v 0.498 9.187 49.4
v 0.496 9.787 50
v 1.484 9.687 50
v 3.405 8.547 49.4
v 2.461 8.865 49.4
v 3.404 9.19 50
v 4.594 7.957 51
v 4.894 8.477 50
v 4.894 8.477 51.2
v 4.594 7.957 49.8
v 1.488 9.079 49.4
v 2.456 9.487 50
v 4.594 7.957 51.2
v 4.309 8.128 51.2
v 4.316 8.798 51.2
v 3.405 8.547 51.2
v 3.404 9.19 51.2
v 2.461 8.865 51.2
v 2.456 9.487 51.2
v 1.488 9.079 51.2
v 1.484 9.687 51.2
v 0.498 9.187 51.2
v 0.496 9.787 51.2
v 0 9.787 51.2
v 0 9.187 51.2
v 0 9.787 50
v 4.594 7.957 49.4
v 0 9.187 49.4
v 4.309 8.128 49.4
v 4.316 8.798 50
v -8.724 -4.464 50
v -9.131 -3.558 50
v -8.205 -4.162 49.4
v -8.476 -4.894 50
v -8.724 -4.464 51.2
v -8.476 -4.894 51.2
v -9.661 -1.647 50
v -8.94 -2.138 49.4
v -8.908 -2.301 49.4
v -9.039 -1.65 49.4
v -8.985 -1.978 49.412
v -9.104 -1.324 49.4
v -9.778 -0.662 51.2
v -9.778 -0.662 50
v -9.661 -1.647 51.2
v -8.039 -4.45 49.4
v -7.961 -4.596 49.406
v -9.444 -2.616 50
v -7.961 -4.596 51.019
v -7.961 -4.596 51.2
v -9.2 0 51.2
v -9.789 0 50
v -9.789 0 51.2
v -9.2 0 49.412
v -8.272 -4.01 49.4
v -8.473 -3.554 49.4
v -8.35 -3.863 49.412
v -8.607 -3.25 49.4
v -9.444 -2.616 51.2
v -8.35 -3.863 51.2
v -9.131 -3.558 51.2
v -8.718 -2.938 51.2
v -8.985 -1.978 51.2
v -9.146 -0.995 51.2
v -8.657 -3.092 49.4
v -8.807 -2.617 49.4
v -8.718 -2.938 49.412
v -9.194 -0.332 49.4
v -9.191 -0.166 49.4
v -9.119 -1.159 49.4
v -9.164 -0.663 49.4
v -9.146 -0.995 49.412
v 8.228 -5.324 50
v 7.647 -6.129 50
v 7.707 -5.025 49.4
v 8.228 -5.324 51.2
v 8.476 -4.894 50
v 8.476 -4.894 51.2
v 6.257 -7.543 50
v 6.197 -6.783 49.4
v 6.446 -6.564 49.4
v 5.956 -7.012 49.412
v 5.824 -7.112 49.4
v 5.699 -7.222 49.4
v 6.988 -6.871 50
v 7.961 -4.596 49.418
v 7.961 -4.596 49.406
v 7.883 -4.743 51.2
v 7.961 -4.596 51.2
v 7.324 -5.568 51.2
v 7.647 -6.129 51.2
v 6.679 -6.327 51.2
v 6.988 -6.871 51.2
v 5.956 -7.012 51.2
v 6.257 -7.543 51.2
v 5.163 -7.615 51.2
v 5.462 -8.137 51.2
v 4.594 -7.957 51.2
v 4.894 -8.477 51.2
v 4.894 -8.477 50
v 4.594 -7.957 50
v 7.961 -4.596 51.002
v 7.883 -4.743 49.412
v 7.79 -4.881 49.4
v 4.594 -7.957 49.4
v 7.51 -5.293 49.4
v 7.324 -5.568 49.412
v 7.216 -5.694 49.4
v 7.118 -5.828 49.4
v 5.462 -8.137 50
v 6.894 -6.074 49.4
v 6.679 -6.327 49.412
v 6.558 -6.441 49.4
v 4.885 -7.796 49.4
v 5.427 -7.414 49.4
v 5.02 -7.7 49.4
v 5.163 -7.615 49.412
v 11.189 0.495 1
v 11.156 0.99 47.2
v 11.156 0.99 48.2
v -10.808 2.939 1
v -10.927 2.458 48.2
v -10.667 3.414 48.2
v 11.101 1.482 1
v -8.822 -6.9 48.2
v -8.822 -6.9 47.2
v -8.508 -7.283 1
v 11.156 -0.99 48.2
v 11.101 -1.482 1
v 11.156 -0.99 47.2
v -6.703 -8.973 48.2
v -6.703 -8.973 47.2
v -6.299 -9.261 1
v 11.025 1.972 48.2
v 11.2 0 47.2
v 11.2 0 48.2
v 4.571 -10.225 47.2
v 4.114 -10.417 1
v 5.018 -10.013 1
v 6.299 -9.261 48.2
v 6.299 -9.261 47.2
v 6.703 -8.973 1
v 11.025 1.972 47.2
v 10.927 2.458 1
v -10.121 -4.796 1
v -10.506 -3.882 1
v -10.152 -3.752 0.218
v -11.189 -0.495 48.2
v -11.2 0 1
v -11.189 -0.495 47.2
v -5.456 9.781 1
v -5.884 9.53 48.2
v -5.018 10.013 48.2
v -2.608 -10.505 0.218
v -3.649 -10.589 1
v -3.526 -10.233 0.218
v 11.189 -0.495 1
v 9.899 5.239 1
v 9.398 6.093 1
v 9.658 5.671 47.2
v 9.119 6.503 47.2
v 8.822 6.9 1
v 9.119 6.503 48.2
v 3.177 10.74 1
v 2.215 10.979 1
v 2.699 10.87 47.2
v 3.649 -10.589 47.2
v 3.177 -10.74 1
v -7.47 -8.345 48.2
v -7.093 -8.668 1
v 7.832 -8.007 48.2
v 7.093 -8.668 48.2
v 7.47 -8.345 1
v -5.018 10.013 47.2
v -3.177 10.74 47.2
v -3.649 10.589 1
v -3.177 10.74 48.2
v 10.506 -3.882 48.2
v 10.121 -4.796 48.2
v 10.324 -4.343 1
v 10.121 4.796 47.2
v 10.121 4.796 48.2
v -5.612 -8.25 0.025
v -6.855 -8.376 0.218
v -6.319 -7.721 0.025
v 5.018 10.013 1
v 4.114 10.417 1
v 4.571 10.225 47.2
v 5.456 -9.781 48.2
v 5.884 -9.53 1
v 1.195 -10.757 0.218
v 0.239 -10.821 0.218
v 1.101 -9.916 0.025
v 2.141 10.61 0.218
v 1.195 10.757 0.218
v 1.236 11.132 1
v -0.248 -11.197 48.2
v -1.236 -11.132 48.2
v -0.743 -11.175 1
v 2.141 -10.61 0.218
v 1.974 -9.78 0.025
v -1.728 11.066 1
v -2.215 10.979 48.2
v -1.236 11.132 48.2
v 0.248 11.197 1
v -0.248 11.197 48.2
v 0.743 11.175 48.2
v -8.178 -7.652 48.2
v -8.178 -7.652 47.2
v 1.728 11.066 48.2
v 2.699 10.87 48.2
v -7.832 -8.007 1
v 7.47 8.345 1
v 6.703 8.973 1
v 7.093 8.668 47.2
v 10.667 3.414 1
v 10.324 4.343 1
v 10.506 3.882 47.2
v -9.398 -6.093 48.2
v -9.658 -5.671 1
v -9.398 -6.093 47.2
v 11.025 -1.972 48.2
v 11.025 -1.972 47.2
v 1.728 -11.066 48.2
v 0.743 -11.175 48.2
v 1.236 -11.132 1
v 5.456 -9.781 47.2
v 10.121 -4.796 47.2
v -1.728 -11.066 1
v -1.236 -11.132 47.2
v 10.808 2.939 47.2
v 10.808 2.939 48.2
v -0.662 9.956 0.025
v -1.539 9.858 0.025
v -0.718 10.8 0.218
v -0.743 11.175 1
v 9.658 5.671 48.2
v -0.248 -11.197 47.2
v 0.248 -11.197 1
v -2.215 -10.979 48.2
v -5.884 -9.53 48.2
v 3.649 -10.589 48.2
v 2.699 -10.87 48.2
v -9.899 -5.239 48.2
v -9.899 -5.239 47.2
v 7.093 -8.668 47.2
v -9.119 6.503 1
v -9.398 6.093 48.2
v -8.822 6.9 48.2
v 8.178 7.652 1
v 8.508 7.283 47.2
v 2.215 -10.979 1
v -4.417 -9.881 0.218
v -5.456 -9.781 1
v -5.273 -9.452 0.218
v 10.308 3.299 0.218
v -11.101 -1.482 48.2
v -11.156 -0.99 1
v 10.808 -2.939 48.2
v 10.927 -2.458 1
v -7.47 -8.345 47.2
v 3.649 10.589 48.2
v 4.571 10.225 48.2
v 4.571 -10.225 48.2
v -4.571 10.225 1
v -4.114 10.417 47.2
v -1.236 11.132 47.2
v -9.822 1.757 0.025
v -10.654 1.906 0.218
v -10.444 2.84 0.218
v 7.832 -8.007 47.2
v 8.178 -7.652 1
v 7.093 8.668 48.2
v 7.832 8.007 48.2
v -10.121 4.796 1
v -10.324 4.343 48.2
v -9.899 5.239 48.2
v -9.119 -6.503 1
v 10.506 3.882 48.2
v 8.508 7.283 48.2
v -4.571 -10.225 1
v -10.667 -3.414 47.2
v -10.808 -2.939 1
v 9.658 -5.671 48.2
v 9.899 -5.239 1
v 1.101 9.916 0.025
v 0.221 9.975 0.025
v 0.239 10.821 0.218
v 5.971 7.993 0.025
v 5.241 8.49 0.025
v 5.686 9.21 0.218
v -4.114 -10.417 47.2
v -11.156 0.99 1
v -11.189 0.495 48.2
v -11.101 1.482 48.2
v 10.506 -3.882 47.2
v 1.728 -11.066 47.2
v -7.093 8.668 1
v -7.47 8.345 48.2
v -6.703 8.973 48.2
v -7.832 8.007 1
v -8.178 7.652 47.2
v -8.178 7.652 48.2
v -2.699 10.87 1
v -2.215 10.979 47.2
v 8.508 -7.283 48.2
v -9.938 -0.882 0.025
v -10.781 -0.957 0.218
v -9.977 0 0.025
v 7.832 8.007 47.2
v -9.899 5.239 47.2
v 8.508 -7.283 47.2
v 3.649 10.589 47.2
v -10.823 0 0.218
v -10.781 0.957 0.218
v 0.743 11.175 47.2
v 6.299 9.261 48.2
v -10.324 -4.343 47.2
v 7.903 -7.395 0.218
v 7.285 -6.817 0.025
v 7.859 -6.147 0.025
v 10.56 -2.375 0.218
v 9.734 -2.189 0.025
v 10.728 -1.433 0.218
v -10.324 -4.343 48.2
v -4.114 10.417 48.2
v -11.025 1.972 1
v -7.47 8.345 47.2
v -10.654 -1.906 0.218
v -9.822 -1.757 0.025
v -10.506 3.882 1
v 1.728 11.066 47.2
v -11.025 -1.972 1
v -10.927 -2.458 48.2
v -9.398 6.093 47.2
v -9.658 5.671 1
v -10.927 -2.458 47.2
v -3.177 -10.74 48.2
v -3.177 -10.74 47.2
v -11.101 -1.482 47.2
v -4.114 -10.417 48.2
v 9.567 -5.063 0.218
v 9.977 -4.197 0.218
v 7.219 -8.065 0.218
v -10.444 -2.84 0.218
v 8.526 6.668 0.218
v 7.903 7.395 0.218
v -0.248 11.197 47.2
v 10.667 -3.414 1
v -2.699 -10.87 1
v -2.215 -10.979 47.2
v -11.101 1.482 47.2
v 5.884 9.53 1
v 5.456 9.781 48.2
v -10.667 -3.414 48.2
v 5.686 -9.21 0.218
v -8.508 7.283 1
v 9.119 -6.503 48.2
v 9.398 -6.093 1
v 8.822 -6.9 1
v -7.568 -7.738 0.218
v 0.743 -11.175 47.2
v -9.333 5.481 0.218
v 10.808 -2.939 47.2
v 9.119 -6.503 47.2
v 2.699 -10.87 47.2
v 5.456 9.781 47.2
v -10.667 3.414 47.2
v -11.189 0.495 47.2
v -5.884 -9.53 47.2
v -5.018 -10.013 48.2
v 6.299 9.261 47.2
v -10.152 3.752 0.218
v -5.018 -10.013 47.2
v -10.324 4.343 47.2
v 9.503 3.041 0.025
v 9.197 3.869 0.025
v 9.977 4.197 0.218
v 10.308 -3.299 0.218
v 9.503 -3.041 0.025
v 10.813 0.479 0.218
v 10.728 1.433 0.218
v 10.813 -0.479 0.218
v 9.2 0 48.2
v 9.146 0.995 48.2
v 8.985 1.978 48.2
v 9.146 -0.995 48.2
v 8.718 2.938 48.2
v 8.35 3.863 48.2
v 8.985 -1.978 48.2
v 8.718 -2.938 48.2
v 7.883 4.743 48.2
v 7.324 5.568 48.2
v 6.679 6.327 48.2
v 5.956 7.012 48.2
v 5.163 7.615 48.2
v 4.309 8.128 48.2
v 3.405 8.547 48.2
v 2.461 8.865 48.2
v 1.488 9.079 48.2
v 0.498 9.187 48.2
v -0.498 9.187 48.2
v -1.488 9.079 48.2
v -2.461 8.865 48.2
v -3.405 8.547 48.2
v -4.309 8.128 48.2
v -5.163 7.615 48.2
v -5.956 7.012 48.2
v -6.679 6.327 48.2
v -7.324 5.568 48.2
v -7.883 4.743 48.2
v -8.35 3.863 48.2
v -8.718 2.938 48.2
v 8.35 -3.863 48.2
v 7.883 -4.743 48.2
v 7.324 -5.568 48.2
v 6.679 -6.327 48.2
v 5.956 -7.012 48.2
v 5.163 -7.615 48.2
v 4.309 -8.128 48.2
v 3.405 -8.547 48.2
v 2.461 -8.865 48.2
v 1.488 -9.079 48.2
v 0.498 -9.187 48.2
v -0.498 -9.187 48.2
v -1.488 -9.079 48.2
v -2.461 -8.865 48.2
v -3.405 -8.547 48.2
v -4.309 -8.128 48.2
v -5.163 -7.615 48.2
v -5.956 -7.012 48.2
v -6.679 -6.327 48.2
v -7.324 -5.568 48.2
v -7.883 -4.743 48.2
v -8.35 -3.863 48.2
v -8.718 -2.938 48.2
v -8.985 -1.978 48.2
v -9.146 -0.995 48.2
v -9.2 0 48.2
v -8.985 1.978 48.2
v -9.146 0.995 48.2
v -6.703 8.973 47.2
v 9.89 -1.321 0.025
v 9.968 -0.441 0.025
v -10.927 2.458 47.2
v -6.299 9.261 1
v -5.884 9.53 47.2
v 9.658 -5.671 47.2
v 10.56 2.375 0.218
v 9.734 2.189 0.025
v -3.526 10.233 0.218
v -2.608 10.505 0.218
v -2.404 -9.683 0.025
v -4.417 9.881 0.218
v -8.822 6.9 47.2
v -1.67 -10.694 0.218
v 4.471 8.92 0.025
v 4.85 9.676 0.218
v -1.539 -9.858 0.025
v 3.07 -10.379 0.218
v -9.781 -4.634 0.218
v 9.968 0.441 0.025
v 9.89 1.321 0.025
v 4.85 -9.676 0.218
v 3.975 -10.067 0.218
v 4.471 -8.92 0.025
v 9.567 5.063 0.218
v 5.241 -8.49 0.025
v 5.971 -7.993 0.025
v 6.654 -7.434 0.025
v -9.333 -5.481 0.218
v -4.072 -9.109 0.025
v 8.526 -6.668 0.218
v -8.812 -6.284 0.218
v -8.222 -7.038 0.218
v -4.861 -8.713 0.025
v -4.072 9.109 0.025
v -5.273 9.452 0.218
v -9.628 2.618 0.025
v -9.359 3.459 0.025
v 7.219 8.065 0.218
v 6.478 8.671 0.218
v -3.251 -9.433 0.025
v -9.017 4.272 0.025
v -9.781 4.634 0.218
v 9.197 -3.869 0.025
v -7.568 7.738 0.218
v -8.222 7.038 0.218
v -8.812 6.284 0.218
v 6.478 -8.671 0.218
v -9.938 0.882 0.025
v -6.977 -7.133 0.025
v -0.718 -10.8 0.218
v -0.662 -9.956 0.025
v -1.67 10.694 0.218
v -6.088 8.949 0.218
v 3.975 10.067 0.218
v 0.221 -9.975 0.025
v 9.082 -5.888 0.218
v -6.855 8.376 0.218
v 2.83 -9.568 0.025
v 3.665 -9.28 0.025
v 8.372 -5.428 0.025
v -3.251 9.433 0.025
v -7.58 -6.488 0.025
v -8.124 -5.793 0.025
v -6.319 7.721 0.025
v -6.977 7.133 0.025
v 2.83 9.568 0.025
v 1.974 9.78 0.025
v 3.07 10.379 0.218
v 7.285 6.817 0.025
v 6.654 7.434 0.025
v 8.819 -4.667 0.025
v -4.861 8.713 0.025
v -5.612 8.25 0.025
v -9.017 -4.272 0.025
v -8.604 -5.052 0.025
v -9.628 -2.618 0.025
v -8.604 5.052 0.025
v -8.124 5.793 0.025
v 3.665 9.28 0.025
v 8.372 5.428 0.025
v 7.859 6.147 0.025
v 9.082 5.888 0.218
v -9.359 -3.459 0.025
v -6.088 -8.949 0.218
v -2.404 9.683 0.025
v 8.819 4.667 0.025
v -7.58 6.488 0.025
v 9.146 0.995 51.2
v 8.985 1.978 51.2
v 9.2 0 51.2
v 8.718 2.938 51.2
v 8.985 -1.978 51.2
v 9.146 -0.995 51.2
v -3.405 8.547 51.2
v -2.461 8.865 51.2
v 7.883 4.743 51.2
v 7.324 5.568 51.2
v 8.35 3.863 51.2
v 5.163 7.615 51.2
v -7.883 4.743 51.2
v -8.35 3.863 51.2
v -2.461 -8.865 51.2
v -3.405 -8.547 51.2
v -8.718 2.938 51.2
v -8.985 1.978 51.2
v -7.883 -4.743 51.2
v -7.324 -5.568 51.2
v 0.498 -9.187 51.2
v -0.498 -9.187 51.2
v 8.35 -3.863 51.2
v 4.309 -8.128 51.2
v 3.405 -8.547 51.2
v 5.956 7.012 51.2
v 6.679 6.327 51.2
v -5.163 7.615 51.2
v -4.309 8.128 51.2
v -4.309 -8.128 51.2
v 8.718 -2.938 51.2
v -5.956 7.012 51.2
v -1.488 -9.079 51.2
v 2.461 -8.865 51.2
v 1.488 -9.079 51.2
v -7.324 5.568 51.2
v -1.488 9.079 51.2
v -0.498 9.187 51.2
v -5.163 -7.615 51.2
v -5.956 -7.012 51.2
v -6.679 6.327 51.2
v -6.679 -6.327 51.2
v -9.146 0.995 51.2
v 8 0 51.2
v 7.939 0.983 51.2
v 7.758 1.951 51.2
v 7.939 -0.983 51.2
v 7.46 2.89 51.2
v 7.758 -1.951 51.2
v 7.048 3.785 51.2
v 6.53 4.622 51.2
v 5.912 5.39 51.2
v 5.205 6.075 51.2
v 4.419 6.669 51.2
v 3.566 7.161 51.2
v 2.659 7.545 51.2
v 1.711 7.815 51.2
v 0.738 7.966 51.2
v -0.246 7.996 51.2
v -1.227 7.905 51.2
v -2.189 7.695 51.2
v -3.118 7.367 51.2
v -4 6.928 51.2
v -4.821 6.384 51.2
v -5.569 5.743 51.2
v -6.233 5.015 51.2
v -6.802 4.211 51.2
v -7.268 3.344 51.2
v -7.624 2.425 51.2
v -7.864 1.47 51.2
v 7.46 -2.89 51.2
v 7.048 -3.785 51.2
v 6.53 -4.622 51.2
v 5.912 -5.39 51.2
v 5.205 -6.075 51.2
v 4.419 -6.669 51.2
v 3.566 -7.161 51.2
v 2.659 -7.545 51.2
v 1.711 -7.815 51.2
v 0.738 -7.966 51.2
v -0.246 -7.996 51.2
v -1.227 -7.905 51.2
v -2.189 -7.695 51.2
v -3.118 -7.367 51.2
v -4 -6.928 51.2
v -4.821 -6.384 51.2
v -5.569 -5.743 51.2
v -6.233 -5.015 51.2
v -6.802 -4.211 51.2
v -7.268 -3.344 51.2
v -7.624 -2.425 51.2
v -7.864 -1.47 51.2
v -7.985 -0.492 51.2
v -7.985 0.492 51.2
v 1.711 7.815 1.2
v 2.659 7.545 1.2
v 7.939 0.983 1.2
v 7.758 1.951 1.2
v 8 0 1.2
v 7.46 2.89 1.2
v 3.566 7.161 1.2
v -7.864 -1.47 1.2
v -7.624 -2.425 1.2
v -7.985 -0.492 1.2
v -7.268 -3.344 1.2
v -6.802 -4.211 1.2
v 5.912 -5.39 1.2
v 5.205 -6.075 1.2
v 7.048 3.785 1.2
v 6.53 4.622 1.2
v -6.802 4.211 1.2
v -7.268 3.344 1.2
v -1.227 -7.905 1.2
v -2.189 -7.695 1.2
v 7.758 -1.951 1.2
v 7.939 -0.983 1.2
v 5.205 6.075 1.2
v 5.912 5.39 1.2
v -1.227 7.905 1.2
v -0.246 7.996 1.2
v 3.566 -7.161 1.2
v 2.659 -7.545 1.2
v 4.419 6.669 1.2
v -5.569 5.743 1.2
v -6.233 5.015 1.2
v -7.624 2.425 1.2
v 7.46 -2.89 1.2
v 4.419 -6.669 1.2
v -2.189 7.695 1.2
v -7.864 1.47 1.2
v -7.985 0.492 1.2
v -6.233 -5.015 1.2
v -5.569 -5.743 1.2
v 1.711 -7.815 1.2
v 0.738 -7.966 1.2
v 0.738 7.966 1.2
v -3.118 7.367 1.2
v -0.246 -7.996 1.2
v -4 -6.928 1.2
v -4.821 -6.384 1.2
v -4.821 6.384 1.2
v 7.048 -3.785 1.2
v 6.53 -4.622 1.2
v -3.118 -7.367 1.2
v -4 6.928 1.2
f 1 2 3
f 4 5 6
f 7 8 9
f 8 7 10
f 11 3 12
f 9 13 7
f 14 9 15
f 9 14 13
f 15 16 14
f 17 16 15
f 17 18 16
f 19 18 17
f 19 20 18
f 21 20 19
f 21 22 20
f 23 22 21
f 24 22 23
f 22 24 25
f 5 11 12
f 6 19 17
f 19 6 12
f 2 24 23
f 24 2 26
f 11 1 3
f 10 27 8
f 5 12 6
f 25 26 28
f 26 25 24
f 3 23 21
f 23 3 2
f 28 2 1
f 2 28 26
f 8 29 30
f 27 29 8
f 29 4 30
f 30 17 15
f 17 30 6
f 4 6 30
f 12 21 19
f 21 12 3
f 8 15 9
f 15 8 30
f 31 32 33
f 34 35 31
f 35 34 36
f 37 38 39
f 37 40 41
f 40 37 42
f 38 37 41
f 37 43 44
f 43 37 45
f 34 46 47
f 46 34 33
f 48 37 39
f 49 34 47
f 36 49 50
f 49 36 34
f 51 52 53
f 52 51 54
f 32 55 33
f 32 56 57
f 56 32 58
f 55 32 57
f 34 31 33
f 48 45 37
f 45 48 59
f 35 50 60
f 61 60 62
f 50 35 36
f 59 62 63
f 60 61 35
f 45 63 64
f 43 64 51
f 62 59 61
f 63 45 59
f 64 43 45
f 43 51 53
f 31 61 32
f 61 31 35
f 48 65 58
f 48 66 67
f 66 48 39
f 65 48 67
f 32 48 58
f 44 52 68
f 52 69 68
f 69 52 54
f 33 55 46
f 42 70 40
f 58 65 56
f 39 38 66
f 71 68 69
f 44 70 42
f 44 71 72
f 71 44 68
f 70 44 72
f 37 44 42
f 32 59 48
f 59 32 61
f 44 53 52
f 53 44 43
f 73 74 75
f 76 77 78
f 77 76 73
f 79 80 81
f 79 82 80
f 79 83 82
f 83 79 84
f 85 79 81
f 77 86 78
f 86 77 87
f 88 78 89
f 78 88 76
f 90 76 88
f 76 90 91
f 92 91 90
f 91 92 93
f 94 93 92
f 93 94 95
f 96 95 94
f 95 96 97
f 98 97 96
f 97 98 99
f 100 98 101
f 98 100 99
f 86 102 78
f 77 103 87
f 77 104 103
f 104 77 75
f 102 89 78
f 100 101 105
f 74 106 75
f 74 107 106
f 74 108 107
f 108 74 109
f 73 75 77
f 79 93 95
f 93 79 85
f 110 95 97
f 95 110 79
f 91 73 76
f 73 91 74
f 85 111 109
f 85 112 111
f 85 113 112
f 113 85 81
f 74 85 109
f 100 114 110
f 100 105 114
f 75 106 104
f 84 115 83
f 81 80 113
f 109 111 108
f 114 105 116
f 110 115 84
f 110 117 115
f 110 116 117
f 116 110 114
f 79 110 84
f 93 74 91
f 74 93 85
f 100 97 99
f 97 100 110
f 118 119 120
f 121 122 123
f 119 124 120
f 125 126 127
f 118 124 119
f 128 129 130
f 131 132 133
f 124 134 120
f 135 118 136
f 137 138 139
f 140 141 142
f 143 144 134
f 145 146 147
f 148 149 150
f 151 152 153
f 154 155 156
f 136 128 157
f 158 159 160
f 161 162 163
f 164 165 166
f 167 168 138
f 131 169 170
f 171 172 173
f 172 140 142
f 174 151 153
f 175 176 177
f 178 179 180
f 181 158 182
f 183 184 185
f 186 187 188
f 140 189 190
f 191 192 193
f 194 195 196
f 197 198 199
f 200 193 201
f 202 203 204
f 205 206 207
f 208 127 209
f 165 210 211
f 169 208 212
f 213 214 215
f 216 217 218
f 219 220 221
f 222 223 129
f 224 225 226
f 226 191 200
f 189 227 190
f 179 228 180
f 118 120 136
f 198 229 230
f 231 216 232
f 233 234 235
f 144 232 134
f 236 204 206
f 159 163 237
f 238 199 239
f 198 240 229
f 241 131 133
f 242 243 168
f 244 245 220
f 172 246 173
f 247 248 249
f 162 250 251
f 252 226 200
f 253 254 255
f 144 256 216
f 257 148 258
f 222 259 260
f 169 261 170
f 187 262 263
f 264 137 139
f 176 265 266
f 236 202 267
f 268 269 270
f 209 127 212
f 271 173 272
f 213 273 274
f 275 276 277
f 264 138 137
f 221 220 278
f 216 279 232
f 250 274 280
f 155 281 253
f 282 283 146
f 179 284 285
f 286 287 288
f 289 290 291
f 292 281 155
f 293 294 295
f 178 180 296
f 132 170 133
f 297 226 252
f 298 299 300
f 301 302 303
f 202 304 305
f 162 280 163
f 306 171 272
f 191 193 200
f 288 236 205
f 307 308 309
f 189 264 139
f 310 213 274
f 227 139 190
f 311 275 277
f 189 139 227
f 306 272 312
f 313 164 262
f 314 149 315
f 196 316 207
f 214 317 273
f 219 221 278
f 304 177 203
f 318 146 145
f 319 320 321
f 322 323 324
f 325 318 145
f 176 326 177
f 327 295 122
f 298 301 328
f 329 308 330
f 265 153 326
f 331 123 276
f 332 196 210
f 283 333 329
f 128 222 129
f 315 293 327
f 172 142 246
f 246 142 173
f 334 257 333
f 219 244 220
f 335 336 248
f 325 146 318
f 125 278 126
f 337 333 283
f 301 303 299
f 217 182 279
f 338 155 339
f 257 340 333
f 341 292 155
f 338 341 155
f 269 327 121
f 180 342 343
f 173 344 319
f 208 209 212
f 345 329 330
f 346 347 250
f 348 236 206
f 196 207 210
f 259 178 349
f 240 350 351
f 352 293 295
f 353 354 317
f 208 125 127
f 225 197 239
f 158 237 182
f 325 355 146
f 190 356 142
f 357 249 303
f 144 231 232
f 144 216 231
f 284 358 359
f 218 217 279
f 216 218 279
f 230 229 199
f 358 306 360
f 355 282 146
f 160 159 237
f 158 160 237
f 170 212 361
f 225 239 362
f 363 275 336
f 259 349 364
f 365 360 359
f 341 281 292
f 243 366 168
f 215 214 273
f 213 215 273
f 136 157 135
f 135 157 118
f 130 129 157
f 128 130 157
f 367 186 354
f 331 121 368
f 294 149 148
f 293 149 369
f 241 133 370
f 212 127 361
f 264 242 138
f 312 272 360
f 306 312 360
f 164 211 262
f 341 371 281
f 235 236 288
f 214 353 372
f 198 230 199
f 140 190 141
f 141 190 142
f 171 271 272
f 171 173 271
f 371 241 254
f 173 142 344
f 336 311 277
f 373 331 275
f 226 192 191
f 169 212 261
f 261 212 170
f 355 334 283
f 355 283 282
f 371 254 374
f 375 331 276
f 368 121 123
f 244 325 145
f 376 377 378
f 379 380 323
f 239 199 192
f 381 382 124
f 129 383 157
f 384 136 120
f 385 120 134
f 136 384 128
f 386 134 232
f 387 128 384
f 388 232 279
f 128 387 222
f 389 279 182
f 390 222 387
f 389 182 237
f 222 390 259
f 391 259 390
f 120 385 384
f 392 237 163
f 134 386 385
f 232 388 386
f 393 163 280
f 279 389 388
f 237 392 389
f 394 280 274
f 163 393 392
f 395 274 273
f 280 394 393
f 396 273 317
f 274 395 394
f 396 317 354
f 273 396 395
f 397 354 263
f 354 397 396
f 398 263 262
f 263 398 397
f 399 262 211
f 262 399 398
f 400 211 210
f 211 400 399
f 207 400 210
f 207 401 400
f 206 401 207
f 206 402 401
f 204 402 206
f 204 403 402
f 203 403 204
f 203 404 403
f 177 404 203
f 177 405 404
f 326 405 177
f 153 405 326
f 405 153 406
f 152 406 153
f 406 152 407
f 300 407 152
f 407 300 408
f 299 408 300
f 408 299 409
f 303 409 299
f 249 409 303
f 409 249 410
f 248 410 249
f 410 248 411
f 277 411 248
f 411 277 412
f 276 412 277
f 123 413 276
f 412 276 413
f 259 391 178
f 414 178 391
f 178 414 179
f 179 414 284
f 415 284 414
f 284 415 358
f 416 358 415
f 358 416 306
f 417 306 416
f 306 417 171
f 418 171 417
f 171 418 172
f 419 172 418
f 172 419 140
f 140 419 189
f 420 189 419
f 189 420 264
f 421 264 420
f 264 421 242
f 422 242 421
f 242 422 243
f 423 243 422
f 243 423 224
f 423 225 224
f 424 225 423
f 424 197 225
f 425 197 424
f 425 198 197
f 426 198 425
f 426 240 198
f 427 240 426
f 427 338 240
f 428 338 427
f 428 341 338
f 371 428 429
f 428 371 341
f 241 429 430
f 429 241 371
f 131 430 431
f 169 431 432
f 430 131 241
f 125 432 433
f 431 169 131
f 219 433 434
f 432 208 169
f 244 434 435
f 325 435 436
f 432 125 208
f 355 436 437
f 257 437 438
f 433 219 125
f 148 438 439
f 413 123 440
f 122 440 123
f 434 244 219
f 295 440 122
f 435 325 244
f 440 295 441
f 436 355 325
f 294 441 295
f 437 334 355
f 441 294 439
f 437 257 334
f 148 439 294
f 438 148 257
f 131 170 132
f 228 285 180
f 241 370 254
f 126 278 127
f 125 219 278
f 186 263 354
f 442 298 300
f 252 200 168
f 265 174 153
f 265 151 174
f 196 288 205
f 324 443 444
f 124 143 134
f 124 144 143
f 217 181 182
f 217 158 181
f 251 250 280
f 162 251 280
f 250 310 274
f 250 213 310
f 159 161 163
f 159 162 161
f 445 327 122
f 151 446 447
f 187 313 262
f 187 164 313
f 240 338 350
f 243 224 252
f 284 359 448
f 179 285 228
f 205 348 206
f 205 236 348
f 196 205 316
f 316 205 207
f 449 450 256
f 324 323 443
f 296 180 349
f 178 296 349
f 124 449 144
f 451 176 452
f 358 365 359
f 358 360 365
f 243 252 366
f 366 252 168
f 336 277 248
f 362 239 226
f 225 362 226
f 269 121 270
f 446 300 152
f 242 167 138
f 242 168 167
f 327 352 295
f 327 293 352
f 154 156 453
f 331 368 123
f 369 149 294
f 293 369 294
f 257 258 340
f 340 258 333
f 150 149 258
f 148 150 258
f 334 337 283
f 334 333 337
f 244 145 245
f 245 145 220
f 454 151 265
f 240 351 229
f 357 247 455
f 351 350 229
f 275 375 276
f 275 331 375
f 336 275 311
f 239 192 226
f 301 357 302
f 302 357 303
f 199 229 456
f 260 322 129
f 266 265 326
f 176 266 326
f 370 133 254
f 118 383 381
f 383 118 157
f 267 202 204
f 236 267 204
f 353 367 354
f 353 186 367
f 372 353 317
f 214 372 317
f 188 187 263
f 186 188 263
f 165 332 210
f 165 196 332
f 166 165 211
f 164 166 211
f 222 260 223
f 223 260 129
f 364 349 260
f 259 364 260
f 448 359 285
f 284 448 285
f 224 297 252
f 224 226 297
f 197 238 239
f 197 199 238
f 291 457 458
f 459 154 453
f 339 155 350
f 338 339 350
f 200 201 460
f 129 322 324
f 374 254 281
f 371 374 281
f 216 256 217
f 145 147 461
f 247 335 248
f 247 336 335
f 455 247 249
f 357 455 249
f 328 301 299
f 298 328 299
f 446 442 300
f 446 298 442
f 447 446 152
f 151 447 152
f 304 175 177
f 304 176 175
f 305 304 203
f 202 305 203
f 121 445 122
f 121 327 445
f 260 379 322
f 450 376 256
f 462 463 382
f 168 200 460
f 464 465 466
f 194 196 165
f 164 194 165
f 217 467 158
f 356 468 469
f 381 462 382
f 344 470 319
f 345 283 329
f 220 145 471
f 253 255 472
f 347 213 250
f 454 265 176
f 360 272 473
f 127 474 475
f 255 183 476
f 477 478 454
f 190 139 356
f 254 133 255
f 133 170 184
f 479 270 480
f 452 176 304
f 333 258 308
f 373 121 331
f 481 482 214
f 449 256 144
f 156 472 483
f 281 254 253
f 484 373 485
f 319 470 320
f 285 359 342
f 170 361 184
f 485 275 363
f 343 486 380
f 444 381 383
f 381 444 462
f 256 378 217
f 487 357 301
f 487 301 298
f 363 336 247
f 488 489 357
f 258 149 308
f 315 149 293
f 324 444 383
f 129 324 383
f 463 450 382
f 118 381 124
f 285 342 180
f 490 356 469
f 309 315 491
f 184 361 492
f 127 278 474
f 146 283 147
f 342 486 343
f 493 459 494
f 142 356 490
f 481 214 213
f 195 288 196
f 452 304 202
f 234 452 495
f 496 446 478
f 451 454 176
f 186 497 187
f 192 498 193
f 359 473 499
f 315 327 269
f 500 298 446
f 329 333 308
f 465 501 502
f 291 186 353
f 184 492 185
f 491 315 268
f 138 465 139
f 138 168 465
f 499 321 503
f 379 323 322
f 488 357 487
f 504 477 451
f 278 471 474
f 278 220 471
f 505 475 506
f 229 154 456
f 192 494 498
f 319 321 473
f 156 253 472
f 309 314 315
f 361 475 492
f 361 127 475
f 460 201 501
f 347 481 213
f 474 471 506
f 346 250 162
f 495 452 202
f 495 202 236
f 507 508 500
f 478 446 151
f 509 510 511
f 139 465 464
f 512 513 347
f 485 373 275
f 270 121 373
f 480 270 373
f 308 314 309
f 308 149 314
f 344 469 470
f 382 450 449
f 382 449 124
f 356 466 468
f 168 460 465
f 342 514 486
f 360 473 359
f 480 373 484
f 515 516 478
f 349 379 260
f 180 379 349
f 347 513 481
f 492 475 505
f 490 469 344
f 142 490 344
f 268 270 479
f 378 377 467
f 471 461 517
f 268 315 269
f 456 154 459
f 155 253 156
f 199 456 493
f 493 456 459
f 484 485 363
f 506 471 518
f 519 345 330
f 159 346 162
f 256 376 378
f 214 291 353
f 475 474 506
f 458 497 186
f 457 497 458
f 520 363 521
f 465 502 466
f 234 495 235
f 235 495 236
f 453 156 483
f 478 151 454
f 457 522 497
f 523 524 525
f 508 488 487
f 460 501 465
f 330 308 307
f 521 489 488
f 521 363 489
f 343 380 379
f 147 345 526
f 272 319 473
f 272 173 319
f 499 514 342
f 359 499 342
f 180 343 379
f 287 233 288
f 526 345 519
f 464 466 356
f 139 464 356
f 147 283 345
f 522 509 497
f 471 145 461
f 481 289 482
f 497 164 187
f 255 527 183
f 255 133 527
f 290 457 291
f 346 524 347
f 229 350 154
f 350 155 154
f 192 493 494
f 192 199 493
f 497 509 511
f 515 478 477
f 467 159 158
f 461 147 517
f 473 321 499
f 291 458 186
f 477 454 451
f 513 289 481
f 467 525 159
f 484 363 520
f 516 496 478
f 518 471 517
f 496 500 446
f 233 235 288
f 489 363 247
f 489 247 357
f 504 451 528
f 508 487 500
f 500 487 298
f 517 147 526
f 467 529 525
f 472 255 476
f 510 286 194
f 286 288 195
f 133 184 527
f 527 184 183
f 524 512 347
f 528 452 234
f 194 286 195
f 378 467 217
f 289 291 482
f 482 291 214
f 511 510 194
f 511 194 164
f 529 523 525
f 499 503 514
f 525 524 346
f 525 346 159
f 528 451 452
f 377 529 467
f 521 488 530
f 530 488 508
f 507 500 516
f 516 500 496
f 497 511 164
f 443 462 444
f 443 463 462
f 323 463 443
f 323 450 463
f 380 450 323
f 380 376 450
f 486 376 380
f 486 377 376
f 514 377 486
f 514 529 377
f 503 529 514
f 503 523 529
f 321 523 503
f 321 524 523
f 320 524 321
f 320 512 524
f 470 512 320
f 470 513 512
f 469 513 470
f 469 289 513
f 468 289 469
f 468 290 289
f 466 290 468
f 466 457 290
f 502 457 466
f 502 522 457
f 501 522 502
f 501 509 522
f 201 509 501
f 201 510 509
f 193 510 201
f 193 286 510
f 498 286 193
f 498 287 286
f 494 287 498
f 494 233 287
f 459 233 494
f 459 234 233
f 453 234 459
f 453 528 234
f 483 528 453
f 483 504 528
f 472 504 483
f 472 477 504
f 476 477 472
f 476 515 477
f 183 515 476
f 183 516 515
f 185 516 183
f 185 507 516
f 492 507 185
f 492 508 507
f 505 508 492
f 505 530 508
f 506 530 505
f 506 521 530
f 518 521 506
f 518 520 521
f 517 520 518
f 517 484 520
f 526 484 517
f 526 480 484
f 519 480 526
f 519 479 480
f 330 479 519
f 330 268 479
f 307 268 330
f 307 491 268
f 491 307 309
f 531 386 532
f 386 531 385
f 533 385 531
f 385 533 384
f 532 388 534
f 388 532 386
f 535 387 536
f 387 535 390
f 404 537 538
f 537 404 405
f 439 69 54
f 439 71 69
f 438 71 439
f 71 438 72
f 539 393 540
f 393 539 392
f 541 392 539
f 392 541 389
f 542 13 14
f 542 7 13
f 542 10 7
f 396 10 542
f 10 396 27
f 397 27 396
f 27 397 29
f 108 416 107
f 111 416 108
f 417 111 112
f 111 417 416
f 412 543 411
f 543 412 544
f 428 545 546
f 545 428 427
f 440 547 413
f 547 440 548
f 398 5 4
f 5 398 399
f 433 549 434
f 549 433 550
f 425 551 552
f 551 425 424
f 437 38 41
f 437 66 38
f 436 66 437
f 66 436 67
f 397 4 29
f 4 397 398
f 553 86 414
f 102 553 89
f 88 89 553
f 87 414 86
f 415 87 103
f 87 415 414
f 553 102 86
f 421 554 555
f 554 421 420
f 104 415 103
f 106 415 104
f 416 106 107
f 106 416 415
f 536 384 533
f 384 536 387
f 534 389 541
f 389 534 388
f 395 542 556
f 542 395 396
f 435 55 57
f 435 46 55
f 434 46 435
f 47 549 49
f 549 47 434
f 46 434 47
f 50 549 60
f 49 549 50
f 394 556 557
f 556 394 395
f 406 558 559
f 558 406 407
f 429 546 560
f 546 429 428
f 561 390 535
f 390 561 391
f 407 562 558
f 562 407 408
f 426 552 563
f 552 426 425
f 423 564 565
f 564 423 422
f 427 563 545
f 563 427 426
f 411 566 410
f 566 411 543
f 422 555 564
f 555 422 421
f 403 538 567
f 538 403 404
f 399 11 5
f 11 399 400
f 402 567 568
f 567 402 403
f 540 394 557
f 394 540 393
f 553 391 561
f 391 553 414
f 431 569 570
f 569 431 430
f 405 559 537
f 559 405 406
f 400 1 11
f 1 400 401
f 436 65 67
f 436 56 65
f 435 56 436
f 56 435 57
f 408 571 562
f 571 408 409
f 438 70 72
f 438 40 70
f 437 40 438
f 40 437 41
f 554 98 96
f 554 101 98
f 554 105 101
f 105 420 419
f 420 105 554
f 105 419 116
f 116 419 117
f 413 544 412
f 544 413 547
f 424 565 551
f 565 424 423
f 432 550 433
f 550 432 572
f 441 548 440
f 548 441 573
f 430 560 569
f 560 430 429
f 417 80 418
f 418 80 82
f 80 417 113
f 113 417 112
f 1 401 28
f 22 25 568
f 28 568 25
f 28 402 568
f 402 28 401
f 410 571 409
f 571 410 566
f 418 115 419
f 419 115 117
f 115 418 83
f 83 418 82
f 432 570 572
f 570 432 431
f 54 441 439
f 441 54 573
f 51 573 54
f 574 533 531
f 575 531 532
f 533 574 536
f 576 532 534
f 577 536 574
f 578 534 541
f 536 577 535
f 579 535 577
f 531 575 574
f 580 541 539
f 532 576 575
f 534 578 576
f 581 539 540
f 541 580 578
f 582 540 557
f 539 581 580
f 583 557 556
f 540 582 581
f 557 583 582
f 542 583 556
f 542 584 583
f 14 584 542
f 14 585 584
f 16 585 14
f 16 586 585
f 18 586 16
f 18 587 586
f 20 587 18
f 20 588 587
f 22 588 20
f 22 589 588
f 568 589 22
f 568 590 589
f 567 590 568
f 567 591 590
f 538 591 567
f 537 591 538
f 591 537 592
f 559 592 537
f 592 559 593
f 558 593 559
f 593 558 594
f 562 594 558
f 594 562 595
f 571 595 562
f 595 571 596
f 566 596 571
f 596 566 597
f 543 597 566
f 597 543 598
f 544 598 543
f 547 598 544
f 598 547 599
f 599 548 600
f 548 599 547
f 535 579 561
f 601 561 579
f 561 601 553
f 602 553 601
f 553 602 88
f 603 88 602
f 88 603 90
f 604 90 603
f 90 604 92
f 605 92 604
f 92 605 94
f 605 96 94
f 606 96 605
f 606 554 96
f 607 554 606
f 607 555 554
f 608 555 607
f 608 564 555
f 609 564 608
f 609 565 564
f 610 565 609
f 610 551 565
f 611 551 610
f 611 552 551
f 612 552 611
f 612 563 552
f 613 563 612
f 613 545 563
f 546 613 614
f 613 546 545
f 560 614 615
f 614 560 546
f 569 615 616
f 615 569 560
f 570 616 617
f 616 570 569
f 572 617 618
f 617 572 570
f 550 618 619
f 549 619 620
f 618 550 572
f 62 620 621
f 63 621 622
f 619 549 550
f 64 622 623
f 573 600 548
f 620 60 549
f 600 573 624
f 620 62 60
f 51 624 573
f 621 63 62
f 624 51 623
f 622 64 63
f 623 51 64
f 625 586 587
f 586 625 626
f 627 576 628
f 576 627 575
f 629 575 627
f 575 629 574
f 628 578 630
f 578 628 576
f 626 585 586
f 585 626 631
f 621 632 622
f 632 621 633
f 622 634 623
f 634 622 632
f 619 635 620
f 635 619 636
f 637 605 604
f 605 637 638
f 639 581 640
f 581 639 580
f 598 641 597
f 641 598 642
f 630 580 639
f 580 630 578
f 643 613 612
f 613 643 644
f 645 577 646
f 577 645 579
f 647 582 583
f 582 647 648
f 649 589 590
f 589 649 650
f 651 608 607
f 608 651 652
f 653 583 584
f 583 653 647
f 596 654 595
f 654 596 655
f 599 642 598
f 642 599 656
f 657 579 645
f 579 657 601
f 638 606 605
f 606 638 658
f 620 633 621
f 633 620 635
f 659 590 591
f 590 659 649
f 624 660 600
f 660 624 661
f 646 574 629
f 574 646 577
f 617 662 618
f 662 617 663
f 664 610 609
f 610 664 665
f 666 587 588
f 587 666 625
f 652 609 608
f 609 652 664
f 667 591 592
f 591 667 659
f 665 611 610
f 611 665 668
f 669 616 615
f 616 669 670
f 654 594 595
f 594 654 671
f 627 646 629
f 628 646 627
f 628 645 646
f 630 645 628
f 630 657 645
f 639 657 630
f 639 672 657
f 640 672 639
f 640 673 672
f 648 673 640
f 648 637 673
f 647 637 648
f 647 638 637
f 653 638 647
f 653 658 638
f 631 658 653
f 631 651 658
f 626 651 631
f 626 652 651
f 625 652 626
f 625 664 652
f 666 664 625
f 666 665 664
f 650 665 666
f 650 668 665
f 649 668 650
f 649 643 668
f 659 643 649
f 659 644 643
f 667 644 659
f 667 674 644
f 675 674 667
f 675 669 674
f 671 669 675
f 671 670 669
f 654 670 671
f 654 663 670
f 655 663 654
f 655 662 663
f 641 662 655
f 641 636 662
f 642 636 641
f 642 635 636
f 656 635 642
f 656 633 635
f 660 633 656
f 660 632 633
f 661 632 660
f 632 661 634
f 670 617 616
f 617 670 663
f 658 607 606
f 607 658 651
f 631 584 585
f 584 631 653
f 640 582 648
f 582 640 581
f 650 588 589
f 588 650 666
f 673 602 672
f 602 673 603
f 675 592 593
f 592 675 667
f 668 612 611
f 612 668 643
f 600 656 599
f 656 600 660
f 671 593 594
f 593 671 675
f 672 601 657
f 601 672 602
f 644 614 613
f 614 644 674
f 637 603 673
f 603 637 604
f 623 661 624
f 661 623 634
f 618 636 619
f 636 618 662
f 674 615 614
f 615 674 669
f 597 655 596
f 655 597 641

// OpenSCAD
// -*- mode: SCAD ; c-file-style: "ellemtel" ; coding: utf-8 -*-
//
// Röhren mit Bajonettverschluss, um DM-Münzen zu lagern.
//
// © 2018 Roland Sieker <ospalh@gmail.com>
// Licence: CC-BY-SA 4.0
// Original:
// https://www.thingiverse.com/thing:56910
// © Walter Hsiao
// Licence: CC-BY-SA


// type to produce
part = "container"; // [container,lid,separator]

// Set this to “render” and click on “Create Thing” when done with the setup.
preview = 1; // [0:render, 1:preview]


// minimum interior diameter of container
_insideDiameter = 16;  // [5:0.1:35]

// height of the container's interior space
_interiorHeight = 50;  // [5:0.1:200]

// exterior style of the part
_style = "round"; // [round, round thin, tapered, polygon, crown, flipped crown]

// for the polygon and crown styles (no effect on other styles)
_numberOfSides = 6;  // [3:1:12]

// the thinnest walls of the container will use this value
_minimumWallThickness = 1.2;

// horizontal thickness used for the top of the lid or bottom of the container
_topBottomThickness = 1.2;

// height of the lip between lid and container
_lipHeight = 3.0;

// how much the locking bayonets protrude (larger values may be needed for larger diameters)
_bayonetDepth = 0.6;

// gap to place between moving parts to adjust how tightly the pieces fit together
_partGap = 0.2;


/* [Hidden] */

// Done with the customizer

// *******************************************************
// Extra parameters. These can be changed reasonably safely.


w = 1.8;  // Wall width
p = 1.2;  // Bottom, top plate height
c = 0.4;  // Clearance
angle = 60; // Overhangs much below 60° are a problem for me


// the thinnest walls of the container will use this value
_minimumWallThickness = 1.2;

// horizontal thickness used for the top of the lid or bottom of the container
_topBottomThickness = 1.2;

// *******************************************************
// Some shortcuts. These shouldn’t be changed

tau = 2 * PI;  // π is still wrong. τ = ⌀ ÷ r

xy_factor = 1/tan(angle);
// To get from a height to a horizontal width inclined correctly
z_factor = tan(angle);  // The other way around

// Override these to specify exterior dimensions instead of interior
// dimensions
outsideDiameter = _insideDiameter +
   2 * (_minimumWallThickness*2 + _partGap + _bayonetDepth);
baseHeight = _interiorHeight + _topBottomThickness - _lipHeight;
separatorHeight = _interiorHeight + _topBottomThickness;
lidHeight = _topBottomThickness + _lipHeight + 2; // 2 mm extra for the bayonet
// No storage space in the lid. That’s what “lid” means.
twistAngle = 60; // amount of twist to close the lid
bayonetAngle = 30; // angular size of the bayonets


some_distance = 2 * _insideDiameter;
ms = 0.01;  // Muggeseggele.

// fn for differently sized objects and fs, fa; all for preview or rendering.
pna = 40;
pnb = 15;
pa = 5;
ps = 1;
rna = 180;
rnb = 30;
ra = 1;
rs = 0.1;
function na() = (preview) ? pna : rna;
function nb() = (preview) ? pnb : rnb;
$fs = (preview) ? ps : rs;
$fa = (preview) ? pa : ra;



// *******************************************************
// End setup



// *******************************************************
// Generate the parts

print_part();
// preview_parts();
// stack_parts();




module print_part()
{
   if (part == "container")
   {
      short_container();
   }
   else if (part == "separator")
   {
      short_separator();
   }
   else if (part == "lid")
   {
      short_lid();
   }
}


module preview_parts()
{
   short_container();
   translate([some_distance, 0, 0])
   {
      short_separator();
   }
   translate([0, some_distance, 0])
   {
      short_lid();
   }
}

module stack_parts()
{
   // intersection() // N.B.: Use only two at a time
   {
      // Pick one
      // short_separator();
      short_container();

      // Dto.
      // translate([0,0,separatorHeight + _lipHeight+ 2*_bayonetDepth+ ms])
      translate([0,0,baseHeight + _lipHeight+ 2*_bayonetDepth+ ms])
      {
         rotate([0,180,0])
         {
            short_lid();
         }
      }
   }
}

// *******************************************************
// I’m being lazy and won’t replace the signatures, but jus add these shortcuts.

module short_container()
{
   container(
      _style, outsideDiameter, baseHeight, _minimumWallThickness,
      _topBottomThickness, _lipHeight, _bayonetDepth, bayonetAngle, _partGap,
      _numberOfSides);
}


module short_separator()
{
   separator(
      _style, outsideDiameter, separatorHeight, _minimumWallThickness,
      _topBottomThickness, _lipHeight, _bayonetDepth, bayonetAngle, _partGap,
      _numberOfSides, twistAngle);
}
module short_lid()
{
   lid(
      _style, outsideDiameter, lidHeight, _minimumWallThickness,
      _topBottomThickness, _lipHeight, _bayonetDepth, bayonetAngle,
      _numberOfSides, twistAngle);

}


// *******************************************************
// Code for the parts themselves


module makeStylizedCylinder(type, diameter, height, rounding, polygonSides)
{
   radius = diameter/2;
   if (type == "crown")
   {
      crownCylinder(polygonSides, radius, height, rounding);
   }
   else if (type == "flipped crown")
   {
      translate([0,0,height])
      {
         mirror([0,0,1])
         {
            crownCylinder(polygonSides, radius, height, rounding);
         }
      }
   }
   else if (type == "polygon")
   {
      polyCylinder(polygonSides, radius, height, rounding);
   }
   else
   {
      roundCylinder(radius, height, rounding);
   }
}

module thread(r1, r2, angle, height, yoffset, rotation, chamfer=0, r3=0, r4=0)
{
   for(a=[0,120,240])
   {
      rotate([0,0,a + rotation])
      {
         translate([0,0,yoffset])
         {
            hull()
            {
               smallArc(r1, r2, angle, height);
               if (chamfer != 0)
               {
                  translate([0,0,chamfer])
                  {
                     smallArc(r3, r4, angle, height);
                  }
               }
            }
         }
      }
   }
}

module container(
   style, diameter, height, wall, base, lipHeight, bayonetDepth, bayonetAngle, partGap, sides)
{
   height = max(height, base+lipHeight);
   radius = diameter/2;
   innerRadius = radius - wall*2 - bayonetDepth - partGap;
   fullHeight = height + lipHeight;
   rounding = 1.0;
   chamfer = bayonetDepth;
   bayonetHeight = (lipHeight-chamfer)/2;
   eps = 0.1;

   difference()
   {
      union()
      {
         // body
         if (style == "tapered")
         {
            taperedCylinder(radius, innerRadius+wall, height, rounding);
         }
         else
         {
            makeStylizedCylinder(style, diameter, height, rounding, sides);
         }

         // lip
         translate([0,0,rounding+eps])
         {
            cylinder(r=innerRadius+wall, h=fullHeight-rounding-eps);
         }

         // bayonet
         thread(
            innerRadius+wall-eps, innerRadius+wall+bayonetDepth, bayonetAngle,
            bayonetHeight, fullHeight - bayonetHeight/2, 0, -chamfer,
            innerRadius, innerRadius+wall);
      }

      // inner cutout
      translate([0,0,base])
      {
         cylinder(r=innerRadius, h=fullHeight);
         if (style == "round thin")
         {
            hull()
            {
               cylinder(r=radius-wall, h=height-base*2 - (radius-innerRadius));
               cylinder(r=innerRadius, h=height-base*2);
            }
         }
      }
   }
}



module lid(
   style, diameter, height, wall, base, lipHeight, bayonetDepth, bayonetAngle,
   sides, twistAngle)
{
   height = max(height, base+lipHeight);
   bayonetAngle = bayonetAngle+2;
   radius = diameter/2;
   innerRadius = radius - wall - bayonetDepth;
   rounding = 1.0;
   chamfer = bayonetDepth;
   bayonetHeight = (lipHeight-chamfer)/2;
   eps = 0.1;

   difference()
   {
      // body (round, hex, knurled)
      if (style == "tapered" || style == "thin")
      {
         taperedCylinder(radius, innerRadius+wall, height, rounding);
      }
      else
      {
         makeStylizedCylinder(style, diameter, height, rounding, sides);
      }

      // inner cutout
      translate([0,0,base])
      {
         cylinder(r=innerRadius, h=height+eps);
         if (style == "round thin")
         {
            hull()
            {
               cylinder(
                  r=radius-wall, h=height-lipHeight-base*2 - (radius-innerRadius));
               cylinder(r=innerRadius, h=height-lipHeight-base*2);
            }
         }
      }
      // bayonet
      thread(
         innerRadius-eps, innerRadius+bayonetDepth, bayonetAngle,
         lipHeight + eps, height - lipHeight/2 + eps/2,
         twistAngle + bayonetAngle);

      // bayonet
      thread(
         innerRadius-eps, innerRadius+bayonetDepth, bayonetAngle+twistAngle,
         bayonetHeight + eps, height - (lipHeight - bayonetHeight/2) + eps/2,
         twistAngle + bayonetAngle, chamfer, innerRadius-eps, innerRadius);
   }
}

module separator(
   style, diameter, height, wall, base, lipHeight, bayonetDepth, bayonetAngle,
   partGap, sides, twistAngle)
{
   height = max(height, base+lipHeight);
   radius = diameter/2;
   innerRadius = radius - wall*2 - bayonetDepth - partGap;
   middleRadius = radius - wall - bayonetDepth;
   wallThickness = radius - innerRadius;
   fullHeight = height + lipHeight;
   rounding = 0;
   topBayonetAngle = bayonetAngle+2;
   chamfer = bayonetDepth;
   bayonetHeight = (lipHeight-chamfer)/2;
   eps = 0.1;

   difference()
   {
      union()
      {
         // lip
         cylinder(r=innerRadius+wall, h=fullHeight);

         // body
         translate([0,0,lipHeight])
         {
            makeStylizedCylinder(style, diameter, height, rounding, sides);
         }
         // bayonet
         thread(
            innerRadius+wall-eps, innerRadius+wall+bayonetDepth, bayonetAngle,
            bayonetHeight, bayonetHeight/2, 0, chamfer, innerRadius,
            innerRadius+wall);
      }

      // inner cutout
      translate([0,0,base])
      {
         cylinder(r=innerRadius, h=fullHeight);
      }
      translate([0,0,lipHeight+max(wall,base)])
      {
         cylinder(r=middleRadius, h=fullHeight);
      }
      if (style == "round thin")
      {
         // assign(cutHeight = height-lipHeight-base*2 - wallThickness*2) {
         cutHeight = height-lipHeight-base*2 - wallThickness*2;
         {
            if (cutHeight > 0)
            {
               translate([0,0,lipHeight+base])
               {
                  hull()
                  {
                     translate([0,0,wallThickness])
                     {
                        cylinder(r=radius-wall, h=cutHeight);
                     }
                  cylinder(r=innerRadius, h=cutHeight + wallThickness*2);
                  }
               }
            }
         }
      }

      // thread cutout
      translate([0,0,fullHeight-lipHeight-partGap])
      {
         cylinder(r=middleRadius, h=lipHeight+partGap+eps);
      }

      // top thread
      thread(
         middleRadius-eps, middleRadius+bayonetDepth, topBayonetAngle,
         lipHeight+eps, fullHeight - lipHeight/2 + eps/2,
         twistAngle + topBayonetAngle);


      // top thread
      thread(
         middleRadius-eps, middleRadius+bayonetDepth,
         topBayonetAngle+twistAngle, bayonetHeight + eps,
         fullHeight - lipHeight + bayonetHeight/2 + eps/2,
         twistAngle + topBayonetAngle, chamfer, middleRadius-eps, middleRadius);
   }
}

////////////// Utility Functions ///////////////////

// only works from [0 to 180] degrees, runs clockwise from 12 o'clock
module smallArc(radius0, radius1, angle, depth)
{
   thickness = radius1 - radius0;
   eps = 0.01;

   union()
   {
      difference()
      {
         // full arc
         cylinder(r=radius1, h=depth, center=true);
         cylinder(r=radius0, h=depth+2*eps, center=true);

         for(z=[0, 180 - angle])
         {
            rotate([0,0,z])
            {
               translate([-radius1,0,0])
               {
                  cube(size = [radius1*2, radius1*2, depth+eps], center=true);
               }
            }
         }
      }
   }
}

module torus(r1, r2)
{
   rotate_extrude(convexity=4)
   {
      translate([r1, 0, 0])
      {
         circle(r = r2);
      }
   }
}

module roundCylinder(radius, height, rounding)
{
   if (rounding == 0)
   {
      cylinder(r=radius, h=height);
   }
   else
   {
      hull()
      {
         translate([0,0,height-rounding])
         {
            cylinder(r=radius, h=rounding);
         }
         translate([0,0,rounding])
         {
            torus(radius-rounding, rounding);
         }
      }
   }
}

module taperedCylinder(radius1, radius2, height, rounding)
{
   eps = 0.1;
   hull()
   {
      translate([0,0,height-eps])
      {
         cylinder(r=radius1, h=eps);
      }

      if (rounding == 0)
      {
         cylinder(r=radius2, h=eps);
      }
      else
      {
         translate([0,0,rounding])
         {
            torus(radius2-rounding, rounding);
         }
      }
   }
}

module crownCylinder(sides, radius, height, rounding)
{
   eps = 0.1;
   angle = 360/sides;
   hull()
   {
      translate([0,0,height-eps])
      {
         cylinder(r=radius, h=eps);
      }
      translate([0,0,rounding])
      {
         hull()
         {
            for (a=[0:angle:360])
            {
               rotate([0,0,a])
               {
                  translate([0,(radius-rounding) / cos(angle/2),0])
                  {
                     if (rounding == 0)
                     {
                        cylinder(r=1, h=eps);
                     }
                     else
                     {
                        sphere(r=rounding, $fn=30);
                     }
                  }
               }
            }
         }
      }
   }
}

module polyCylinder(sides, radius, height, rounding)
{
   angle = 360/sides;
   if (rounding == 0)
   {
      hull()
      {
         for (a=[0:angle:360])
         {
            rotate([0,0,a])
            {
               translate([0,(radius - rounding)/cos(angle/2),0])
               {
                  cylinder(r=1, h=height, $fn=30);
               }
            }
         }
      }
   }
   else
   {
      hull()
      {
         translate([0,0,height-rounding])
         {
            hull()
            {
               for (a=[0:angle:360])
               {
                  rotate([0,0,a])
                  {
                     translate([0,(radius - rounding)/cos(angle/2),0])
                     {
                        cylinder(r=rounding, h=rounding, $fn=30);
                     }
                  }
               }
            }
         }
         translate([0,0,rounding])
         {
            hull()
            {
               for (a=[0:angle:360])
               {
                  rotate([0,0,a])
                  {
                     translate([0,(radius - rounding) / cos(angle/2),0])
                     {
                        sphere(r=rounding, $fn=30);
                     }
                  }
               }
            }
         }
      }
   }
}
